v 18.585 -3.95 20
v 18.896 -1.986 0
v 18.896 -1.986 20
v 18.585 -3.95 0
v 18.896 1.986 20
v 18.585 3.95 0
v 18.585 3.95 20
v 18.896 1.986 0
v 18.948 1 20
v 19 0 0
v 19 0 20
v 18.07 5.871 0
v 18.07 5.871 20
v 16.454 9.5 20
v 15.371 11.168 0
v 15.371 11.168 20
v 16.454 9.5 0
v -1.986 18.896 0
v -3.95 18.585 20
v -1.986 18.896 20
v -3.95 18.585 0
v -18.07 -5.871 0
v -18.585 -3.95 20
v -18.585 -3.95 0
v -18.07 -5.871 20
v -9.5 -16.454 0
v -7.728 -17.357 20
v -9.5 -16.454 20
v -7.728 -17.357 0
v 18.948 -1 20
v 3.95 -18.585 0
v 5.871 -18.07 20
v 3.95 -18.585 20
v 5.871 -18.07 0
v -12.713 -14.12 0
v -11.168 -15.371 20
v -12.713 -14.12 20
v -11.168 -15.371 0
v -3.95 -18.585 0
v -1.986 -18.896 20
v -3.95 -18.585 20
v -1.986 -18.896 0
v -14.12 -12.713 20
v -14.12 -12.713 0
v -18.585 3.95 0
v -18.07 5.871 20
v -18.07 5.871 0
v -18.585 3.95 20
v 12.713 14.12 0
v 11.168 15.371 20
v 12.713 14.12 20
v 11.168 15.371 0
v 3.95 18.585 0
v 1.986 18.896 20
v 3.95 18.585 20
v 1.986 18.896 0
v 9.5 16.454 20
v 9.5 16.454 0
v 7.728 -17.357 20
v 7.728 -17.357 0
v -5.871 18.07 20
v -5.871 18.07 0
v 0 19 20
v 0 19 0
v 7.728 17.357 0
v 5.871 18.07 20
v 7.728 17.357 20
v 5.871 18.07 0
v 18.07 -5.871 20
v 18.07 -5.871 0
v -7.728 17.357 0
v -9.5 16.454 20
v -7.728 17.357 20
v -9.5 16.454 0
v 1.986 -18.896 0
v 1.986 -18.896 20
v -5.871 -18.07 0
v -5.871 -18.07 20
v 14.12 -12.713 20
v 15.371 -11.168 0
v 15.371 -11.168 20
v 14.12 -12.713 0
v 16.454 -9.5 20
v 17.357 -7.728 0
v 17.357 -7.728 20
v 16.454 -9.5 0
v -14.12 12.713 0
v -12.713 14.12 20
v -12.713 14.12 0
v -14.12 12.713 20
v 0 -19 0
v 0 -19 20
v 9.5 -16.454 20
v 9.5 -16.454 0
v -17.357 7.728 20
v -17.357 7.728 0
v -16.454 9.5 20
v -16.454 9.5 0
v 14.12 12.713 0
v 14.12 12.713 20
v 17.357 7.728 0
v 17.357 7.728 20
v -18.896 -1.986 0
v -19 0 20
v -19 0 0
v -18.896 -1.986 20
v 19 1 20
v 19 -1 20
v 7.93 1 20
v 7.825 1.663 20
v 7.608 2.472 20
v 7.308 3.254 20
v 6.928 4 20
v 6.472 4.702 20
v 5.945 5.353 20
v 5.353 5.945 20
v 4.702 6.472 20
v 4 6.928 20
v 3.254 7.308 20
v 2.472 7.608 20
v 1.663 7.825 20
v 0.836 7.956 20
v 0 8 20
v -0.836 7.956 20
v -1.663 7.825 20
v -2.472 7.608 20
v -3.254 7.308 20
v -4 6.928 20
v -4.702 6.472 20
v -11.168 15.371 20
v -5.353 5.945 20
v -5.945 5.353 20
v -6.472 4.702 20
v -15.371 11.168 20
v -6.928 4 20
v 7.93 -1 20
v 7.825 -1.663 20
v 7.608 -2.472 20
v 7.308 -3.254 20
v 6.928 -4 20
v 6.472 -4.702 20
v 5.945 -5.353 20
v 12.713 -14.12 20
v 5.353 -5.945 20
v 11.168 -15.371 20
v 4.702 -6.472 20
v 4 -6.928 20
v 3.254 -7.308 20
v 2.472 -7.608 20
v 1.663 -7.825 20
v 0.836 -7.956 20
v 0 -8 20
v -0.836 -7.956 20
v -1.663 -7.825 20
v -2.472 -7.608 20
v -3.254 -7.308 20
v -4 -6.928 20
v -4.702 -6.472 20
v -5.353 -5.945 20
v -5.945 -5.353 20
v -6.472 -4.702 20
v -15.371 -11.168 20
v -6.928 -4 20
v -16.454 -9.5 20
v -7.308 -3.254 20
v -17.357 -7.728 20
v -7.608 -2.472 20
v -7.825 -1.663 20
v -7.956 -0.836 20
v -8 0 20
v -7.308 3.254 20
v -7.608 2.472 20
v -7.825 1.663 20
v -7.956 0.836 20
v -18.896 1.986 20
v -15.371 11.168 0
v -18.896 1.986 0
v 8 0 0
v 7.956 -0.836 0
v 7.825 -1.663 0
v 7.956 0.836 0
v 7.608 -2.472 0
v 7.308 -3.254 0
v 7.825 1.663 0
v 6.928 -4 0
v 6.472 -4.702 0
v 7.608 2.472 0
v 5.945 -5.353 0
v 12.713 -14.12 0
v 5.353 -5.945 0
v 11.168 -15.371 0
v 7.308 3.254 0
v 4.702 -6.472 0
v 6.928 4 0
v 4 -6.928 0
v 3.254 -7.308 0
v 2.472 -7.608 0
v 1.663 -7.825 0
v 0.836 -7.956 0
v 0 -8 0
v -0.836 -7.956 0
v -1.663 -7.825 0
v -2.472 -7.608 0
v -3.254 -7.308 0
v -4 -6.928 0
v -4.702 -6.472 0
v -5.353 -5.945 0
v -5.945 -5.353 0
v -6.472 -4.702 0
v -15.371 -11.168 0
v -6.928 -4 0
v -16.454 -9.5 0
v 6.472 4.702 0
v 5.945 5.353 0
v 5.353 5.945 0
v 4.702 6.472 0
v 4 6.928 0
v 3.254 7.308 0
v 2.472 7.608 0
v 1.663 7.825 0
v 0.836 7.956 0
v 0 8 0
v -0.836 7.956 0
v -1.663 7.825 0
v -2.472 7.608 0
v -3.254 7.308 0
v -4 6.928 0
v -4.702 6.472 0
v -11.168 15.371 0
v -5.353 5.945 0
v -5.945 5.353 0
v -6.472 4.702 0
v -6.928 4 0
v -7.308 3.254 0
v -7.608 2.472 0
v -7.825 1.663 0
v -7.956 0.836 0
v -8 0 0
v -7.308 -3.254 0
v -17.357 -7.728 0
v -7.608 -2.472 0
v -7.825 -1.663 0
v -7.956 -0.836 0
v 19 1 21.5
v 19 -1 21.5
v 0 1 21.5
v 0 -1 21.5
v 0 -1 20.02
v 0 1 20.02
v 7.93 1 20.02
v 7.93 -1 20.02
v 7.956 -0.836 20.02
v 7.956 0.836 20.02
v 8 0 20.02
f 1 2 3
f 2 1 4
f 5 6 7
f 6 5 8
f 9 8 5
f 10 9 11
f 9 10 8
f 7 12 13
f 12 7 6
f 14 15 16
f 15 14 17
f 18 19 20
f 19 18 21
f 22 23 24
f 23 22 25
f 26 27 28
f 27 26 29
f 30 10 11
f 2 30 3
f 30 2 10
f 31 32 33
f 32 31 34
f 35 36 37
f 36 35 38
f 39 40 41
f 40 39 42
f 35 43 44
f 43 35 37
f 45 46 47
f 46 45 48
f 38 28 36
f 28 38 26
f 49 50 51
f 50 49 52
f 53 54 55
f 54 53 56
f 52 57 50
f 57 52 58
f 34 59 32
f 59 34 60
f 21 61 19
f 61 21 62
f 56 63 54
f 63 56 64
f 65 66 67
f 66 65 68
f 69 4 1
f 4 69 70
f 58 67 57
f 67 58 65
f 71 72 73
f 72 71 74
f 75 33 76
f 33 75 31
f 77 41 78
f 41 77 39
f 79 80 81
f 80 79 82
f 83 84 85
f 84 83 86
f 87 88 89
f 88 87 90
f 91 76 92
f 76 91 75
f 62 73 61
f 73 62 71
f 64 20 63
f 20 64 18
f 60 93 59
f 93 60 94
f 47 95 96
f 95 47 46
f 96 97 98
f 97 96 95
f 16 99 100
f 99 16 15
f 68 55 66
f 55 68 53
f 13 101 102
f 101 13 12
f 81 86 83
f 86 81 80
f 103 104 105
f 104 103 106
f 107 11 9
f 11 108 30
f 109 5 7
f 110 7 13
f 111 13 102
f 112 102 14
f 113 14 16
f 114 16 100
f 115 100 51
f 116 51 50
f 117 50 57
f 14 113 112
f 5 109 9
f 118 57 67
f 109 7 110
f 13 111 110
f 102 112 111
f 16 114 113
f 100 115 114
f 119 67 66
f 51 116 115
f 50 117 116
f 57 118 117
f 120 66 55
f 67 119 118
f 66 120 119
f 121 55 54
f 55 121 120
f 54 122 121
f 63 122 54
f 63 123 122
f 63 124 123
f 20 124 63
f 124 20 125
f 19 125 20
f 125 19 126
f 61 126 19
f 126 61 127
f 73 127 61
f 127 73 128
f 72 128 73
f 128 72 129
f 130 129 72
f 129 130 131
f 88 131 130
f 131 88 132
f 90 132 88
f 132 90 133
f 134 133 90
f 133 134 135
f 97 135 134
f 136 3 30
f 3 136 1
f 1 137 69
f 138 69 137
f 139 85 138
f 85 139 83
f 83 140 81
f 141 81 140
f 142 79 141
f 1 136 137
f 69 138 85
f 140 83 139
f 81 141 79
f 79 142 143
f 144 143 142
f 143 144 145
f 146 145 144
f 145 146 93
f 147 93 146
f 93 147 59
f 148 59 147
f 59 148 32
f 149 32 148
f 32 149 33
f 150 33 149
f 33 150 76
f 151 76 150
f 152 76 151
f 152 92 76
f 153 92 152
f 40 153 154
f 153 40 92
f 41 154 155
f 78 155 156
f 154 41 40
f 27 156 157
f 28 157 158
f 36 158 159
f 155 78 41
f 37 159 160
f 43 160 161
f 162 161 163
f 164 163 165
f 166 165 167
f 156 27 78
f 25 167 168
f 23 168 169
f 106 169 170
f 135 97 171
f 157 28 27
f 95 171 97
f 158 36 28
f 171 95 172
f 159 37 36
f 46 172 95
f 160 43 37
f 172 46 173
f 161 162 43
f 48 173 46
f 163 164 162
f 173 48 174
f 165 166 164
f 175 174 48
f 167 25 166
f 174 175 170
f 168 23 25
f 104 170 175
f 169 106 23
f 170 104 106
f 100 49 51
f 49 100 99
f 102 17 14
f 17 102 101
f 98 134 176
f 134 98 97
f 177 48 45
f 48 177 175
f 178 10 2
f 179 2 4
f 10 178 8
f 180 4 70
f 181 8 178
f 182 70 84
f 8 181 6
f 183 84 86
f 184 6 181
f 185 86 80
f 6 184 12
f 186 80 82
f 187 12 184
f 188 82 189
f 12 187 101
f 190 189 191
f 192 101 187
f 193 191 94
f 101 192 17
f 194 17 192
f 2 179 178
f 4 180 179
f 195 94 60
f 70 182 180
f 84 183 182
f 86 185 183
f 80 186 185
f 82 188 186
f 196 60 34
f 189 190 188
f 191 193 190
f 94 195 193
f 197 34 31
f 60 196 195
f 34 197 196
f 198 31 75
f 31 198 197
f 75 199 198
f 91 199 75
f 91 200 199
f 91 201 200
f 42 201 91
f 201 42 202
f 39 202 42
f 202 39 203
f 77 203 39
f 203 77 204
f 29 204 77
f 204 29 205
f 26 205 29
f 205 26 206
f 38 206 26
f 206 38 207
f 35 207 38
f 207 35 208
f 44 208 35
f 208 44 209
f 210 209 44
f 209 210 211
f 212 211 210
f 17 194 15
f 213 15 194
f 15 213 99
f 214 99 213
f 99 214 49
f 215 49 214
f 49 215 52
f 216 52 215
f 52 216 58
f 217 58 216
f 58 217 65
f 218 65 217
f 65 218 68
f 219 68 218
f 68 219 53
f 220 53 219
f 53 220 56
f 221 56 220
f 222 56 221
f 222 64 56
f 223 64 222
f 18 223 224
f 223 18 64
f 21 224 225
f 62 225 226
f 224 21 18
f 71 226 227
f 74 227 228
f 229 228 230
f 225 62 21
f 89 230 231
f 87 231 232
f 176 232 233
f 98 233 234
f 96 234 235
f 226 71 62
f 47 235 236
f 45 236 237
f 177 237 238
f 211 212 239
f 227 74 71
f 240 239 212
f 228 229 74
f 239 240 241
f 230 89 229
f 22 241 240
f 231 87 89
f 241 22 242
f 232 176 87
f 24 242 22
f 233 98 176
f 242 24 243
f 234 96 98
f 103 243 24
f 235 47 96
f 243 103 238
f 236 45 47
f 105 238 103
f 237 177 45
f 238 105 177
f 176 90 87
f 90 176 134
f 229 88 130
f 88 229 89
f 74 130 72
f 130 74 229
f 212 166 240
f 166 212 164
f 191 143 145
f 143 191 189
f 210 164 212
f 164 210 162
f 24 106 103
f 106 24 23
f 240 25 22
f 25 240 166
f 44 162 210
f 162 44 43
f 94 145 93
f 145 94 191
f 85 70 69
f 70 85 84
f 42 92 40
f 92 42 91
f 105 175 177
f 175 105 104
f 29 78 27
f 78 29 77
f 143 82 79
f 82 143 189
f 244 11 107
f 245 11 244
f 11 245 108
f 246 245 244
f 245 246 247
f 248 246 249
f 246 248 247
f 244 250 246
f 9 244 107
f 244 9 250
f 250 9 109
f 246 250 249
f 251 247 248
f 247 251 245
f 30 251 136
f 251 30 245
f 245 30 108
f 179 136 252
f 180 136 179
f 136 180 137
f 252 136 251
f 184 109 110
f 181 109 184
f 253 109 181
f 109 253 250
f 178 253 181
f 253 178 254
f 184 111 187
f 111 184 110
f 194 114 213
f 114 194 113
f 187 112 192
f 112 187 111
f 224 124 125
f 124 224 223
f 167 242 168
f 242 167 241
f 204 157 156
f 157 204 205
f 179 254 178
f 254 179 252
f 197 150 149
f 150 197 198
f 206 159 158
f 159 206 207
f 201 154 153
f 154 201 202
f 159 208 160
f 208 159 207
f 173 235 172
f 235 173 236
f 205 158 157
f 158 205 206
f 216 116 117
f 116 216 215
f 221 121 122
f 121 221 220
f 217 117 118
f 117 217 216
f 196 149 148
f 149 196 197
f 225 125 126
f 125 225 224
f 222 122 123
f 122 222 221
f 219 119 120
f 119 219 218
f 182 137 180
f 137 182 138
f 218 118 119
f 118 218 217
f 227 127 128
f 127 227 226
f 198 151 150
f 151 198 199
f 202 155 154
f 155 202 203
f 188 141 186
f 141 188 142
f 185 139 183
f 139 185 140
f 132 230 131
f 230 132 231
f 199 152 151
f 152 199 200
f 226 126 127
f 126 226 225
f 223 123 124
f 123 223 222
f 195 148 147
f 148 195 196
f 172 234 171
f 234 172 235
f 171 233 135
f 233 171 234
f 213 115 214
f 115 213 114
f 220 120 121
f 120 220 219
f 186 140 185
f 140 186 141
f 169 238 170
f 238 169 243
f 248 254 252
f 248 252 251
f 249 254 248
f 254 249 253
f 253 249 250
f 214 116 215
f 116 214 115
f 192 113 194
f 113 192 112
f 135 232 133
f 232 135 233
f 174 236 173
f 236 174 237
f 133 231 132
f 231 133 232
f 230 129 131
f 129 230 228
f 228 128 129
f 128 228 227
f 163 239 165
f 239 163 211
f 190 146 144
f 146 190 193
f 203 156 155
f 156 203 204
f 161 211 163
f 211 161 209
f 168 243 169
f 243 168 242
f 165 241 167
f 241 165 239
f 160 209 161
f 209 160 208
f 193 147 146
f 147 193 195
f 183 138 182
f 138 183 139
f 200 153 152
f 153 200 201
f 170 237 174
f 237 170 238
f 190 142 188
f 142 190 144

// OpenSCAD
// Pointer control knob.
$fn = 60;
eps = 0.02;
bore_d = 16;
knob_d = 38;
knob_h = 20;
difference() { union() { cylinder(d=knob_d,h=knob_h); translate([0,-1,knob_h]) cube([knob_d/2,2,1.5]); } translate([0,0,-eps]) cylinder(d=bore_d,h=knob_h+2*eps); }
